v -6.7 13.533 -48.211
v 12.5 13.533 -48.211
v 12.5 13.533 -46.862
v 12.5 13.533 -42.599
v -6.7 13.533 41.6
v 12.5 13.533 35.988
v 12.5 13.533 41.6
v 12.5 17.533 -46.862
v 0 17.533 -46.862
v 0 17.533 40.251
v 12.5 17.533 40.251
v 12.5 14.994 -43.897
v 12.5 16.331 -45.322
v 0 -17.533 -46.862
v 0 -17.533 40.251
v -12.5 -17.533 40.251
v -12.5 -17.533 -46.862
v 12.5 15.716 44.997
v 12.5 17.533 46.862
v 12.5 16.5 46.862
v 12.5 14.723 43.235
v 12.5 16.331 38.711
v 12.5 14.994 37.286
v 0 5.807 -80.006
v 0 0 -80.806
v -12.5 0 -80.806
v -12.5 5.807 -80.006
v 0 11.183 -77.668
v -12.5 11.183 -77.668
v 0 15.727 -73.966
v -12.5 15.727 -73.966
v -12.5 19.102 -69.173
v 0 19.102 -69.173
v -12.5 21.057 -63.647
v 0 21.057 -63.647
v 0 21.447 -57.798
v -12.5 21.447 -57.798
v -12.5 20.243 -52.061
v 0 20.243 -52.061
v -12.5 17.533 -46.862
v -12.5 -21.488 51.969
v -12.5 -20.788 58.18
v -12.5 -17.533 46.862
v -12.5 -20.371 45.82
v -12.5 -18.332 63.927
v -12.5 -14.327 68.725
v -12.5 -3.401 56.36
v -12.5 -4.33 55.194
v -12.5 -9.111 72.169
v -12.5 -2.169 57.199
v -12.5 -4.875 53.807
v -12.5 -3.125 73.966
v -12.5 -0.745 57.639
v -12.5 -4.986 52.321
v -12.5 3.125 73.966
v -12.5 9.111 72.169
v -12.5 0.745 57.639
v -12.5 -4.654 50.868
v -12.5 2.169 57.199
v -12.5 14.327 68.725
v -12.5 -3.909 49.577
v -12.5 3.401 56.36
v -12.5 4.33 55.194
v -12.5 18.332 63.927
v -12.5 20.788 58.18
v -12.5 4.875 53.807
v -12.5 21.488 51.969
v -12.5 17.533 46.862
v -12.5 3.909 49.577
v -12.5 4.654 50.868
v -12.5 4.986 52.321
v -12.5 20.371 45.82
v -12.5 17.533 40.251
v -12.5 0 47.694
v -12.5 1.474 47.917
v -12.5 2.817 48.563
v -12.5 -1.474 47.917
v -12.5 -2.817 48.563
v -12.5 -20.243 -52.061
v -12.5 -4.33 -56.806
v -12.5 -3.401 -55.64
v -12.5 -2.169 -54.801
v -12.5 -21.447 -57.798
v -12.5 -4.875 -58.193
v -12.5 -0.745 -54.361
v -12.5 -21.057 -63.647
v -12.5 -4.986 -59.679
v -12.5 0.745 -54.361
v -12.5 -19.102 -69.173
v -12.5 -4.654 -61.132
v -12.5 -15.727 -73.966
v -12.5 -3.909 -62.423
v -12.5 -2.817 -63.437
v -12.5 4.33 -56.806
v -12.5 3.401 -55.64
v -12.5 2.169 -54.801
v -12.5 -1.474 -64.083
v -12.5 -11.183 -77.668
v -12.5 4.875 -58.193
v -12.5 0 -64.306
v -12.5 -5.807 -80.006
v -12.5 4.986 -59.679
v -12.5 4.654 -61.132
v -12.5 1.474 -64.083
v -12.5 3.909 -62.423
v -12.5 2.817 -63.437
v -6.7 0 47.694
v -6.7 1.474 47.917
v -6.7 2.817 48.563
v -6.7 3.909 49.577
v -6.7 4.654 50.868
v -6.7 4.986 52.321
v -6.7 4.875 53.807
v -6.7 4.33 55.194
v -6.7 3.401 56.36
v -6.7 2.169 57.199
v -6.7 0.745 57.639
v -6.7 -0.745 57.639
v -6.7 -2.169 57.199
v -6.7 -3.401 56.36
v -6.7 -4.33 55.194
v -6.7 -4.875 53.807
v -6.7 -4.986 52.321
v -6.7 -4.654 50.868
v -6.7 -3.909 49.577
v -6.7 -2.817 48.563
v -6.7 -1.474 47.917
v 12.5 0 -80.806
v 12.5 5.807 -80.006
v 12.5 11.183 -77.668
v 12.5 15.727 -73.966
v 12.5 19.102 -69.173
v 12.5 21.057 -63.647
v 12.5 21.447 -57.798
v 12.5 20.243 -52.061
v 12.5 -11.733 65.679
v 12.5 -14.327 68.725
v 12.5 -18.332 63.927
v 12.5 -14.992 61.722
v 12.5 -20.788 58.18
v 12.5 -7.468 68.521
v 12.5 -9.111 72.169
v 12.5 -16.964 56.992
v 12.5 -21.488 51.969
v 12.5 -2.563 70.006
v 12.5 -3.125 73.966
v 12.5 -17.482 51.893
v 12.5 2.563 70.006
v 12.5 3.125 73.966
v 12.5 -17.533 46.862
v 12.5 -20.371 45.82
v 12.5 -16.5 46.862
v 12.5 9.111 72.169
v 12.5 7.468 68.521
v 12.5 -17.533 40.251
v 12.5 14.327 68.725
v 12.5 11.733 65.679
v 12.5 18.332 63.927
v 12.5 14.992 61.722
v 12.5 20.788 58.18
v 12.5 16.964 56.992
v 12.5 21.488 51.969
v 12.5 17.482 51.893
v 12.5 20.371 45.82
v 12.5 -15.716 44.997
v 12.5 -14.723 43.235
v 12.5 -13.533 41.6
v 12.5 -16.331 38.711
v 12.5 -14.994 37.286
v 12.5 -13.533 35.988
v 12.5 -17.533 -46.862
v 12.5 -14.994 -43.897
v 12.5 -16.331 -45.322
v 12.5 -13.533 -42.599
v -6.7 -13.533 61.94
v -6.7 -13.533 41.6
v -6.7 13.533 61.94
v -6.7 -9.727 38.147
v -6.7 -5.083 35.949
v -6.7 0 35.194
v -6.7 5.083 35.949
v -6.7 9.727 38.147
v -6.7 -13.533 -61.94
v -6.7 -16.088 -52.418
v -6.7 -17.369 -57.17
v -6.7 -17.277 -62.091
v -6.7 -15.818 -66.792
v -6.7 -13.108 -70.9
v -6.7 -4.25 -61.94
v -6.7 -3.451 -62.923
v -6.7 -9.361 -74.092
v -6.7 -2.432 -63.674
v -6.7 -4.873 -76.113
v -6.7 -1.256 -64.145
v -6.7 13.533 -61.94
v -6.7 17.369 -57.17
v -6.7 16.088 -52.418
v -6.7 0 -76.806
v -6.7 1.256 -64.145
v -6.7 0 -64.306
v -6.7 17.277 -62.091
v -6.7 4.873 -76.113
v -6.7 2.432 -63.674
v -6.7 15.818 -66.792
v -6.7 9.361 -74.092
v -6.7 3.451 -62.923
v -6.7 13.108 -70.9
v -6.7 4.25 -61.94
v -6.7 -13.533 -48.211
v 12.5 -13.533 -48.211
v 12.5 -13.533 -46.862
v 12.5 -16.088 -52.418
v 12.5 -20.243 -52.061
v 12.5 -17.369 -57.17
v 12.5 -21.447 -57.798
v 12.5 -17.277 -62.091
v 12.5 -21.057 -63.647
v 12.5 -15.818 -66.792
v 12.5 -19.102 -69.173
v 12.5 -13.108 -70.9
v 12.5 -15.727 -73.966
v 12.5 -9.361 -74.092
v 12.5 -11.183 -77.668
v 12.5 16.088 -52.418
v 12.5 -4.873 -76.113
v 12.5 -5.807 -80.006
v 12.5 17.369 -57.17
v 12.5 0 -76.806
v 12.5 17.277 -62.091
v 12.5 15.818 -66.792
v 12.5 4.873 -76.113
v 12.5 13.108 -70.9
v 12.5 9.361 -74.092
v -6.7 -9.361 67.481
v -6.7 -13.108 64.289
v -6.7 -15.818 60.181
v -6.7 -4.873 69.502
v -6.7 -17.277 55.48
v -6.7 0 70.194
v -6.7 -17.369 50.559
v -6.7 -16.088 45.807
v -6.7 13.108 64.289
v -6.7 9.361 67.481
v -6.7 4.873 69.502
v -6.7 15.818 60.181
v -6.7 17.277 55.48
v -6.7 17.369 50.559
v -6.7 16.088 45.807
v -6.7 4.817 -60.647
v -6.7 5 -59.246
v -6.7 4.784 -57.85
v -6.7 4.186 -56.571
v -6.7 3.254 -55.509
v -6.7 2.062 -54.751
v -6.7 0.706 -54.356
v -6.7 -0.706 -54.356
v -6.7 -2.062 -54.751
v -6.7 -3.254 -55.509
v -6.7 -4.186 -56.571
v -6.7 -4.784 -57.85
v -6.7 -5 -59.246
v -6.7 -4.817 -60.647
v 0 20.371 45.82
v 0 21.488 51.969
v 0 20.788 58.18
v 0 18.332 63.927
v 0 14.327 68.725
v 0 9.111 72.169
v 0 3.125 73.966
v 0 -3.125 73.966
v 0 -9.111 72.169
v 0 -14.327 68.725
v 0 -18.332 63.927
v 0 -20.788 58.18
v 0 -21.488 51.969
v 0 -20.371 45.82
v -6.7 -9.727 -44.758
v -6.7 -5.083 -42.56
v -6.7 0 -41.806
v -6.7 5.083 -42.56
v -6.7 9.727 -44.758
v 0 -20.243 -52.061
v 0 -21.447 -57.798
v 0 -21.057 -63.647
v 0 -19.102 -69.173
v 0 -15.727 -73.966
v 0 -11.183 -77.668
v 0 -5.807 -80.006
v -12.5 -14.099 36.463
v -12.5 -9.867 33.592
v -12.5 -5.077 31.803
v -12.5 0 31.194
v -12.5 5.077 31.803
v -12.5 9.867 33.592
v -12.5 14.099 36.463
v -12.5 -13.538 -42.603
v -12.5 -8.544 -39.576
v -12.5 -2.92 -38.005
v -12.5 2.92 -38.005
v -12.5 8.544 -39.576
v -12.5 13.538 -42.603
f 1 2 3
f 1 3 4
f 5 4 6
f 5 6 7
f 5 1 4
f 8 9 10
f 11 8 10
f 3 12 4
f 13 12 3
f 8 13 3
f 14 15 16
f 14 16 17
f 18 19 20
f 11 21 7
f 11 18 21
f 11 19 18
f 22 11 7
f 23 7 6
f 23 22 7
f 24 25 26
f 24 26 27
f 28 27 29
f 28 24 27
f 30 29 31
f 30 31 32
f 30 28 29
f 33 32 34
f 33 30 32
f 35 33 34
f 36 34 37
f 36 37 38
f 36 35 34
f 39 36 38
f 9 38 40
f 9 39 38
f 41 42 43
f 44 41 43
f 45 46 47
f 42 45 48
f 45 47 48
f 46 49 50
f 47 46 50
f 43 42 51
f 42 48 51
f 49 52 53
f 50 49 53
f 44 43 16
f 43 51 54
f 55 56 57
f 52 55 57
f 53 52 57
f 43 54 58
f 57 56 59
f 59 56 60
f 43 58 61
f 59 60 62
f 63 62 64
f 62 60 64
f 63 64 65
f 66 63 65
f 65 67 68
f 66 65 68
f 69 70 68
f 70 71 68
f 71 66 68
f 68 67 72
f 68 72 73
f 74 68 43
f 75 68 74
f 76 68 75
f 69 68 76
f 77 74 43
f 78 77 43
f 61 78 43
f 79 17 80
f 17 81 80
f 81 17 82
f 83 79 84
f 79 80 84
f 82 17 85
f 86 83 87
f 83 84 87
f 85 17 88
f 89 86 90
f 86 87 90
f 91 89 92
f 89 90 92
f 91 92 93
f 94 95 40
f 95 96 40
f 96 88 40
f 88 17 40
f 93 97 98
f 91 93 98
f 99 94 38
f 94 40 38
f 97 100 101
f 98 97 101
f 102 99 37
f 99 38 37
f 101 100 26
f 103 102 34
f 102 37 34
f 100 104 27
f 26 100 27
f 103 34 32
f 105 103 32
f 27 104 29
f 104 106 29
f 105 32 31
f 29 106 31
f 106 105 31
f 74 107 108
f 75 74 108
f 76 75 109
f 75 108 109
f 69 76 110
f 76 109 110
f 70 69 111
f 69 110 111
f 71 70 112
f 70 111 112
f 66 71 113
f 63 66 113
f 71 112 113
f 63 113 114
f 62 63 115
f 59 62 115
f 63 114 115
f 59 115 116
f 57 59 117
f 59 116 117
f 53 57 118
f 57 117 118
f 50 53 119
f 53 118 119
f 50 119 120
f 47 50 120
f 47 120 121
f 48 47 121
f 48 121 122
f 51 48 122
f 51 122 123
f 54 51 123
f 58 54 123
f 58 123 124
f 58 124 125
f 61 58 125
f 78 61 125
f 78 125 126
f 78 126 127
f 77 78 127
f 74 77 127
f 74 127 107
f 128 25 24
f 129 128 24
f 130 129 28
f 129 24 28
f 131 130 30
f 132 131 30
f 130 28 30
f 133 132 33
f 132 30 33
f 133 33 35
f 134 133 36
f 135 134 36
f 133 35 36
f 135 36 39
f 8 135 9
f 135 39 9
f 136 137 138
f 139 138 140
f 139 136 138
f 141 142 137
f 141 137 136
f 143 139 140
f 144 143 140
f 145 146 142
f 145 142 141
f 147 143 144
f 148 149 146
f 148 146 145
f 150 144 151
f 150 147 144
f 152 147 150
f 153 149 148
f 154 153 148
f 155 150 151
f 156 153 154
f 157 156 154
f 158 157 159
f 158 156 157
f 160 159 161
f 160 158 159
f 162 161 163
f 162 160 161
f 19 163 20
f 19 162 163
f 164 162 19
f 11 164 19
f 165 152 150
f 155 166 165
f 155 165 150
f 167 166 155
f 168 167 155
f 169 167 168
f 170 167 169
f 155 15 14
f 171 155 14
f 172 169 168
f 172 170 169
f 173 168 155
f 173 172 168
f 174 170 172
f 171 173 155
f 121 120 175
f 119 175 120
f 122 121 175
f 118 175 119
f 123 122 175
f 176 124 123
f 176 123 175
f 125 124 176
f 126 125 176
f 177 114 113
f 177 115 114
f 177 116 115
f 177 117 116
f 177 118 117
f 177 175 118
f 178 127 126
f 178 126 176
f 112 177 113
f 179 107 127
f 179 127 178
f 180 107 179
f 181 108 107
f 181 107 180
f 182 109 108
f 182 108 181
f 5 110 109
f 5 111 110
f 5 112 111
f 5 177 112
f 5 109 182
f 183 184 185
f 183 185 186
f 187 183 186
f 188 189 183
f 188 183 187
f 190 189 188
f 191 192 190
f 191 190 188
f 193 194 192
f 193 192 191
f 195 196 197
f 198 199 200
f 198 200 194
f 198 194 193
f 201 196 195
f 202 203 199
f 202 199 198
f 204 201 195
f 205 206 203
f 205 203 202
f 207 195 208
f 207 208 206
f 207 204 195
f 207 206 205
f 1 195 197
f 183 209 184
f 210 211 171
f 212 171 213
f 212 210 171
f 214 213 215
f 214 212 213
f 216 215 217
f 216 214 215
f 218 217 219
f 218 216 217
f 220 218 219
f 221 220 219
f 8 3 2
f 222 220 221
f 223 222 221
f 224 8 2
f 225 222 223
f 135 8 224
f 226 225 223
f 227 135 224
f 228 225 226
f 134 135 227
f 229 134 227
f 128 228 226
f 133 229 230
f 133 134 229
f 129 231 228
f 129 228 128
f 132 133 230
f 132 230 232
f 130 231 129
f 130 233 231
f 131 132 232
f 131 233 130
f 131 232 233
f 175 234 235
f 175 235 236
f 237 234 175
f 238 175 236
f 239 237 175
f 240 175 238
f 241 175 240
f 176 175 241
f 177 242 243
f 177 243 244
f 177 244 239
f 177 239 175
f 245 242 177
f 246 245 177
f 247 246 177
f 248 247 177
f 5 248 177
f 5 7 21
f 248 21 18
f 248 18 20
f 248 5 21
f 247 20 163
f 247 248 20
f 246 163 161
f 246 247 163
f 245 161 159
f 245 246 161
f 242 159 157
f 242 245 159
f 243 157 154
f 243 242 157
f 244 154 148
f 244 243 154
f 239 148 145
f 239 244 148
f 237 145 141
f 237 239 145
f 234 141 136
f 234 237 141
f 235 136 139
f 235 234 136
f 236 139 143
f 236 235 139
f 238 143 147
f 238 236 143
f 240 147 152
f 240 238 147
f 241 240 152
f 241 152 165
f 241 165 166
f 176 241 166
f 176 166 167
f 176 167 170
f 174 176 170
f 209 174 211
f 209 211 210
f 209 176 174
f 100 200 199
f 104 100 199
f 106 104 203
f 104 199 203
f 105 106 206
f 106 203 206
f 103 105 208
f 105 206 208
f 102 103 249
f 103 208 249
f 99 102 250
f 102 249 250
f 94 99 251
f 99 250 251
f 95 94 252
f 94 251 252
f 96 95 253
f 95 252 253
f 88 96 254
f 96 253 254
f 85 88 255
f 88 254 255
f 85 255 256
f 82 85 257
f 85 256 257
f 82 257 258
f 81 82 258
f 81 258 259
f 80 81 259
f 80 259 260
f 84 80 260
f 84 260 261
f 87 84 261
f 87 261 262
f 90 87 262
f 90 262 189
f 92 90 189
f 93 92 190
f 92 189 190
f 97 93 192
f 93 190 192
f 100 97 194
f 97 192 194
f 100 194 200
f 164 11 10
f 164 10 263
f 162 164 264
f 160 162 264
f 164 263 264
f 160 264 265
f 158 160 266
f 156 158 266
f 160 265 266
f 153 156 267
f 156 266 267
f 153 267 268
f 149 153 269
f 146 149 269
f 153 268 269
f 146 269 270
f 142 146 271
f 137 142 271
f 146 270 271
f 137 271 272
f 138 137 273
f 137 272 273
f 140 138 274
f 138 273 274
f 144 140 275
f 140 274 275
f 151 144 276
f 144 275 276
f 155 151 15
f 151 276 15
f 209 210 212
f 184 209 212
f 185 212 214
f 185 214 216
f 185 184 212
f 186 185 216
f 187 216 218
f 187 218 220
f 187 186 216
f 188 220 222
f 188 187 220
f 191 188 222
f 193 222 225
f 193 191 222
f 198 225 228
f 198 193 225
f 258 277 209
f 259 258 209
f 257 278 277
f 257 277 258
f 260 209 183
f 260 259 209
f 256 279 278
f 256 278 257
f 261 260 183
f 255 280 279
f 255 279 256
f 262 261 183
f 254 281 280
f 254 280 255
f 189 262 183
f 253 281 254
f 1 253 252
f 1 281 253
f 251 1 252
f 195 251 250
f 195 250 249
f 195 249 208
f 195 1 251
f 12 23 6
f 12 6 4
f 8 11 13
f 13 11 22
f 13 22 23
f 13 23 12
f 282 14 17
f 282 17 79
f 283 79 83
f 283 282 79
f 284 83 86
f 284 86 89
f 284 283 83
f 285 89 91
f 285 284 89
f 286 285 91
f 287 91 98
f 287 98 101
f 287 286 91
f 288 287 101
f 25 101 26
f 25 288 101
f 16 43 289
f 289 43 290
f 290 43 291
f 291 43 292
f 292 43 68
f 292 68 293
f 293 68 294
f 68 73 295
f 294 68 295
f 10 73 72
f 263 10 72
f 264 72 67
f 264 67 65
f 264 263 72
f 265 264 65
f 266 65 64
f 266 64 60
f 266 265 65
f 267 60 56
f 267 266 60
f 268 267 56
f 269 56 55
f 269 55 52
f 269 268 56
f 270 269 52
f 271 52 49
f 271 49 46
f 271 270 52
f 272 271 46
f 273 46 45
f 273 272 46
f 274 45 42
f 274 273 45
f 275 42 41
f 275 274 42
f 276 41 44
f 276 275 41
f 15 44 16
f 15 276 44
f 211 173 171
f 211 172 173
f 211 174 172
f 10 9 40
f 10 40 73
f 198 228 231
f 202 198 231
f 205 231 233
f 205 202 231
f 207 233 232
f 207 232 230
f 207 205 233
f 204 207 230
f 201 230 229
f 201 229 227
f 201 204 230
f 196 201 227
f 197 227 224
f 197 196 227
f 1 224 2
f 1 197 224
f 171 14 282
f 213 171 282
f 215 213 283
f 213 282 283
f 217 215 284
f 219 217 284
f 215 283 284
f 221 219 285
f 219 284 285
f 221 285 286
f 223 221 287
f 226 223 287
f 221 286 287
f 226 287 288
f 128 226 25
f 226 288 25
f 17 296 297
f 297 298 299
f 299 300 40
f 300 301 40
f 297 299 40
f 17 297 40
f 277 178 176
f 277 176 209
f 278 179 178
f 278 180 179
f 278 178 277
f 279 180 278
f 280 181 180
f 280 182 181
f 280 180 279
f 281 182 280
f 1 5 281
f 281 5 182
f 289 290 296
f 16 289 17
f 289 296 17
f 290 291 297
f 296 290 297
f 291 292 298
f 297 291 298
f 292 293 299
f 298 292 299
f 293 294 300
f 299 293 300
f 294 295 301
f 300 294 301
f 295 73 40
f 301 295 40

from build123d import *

# Parameters (mm, degrees)
CROQUIS1_R              = 5
SALIENTE_EXTRUIR1_DEPTH = 12.5
CORTAR_EXTRUIR1_START   = -19.2
CROQUIS2_R              = 5
CORTAR_EXTRUIR1_DEPTH   = 19.2


with BuildPart() as part:
    # Croquis1 → Saliente-Extruir1 (new, symmetric)
    # profile 1 of 5: a face of its own
    with BuildSketch(Plane(origin=(0, 0, 0), x_dir=(0, 0, -1), z_dir=(1, 0, 0))):
        with BuildLine():
            Line((-46.862494928, -17.533403612), (-46.862494928, 17.533403612))
            Line((-46.862494928, 17.533403612), (-40.251383817, 17.533403612))
            ThreePointArc((-40.251383817, 17.533403612), (-74.194444444, 0), (-40.251383817, -17.533403612))
            Line((-40.251383817, -17.533403612), (-46.862494928, -17.533403612))
        make_face()
        with Locations((-52.694444444, 0)):
            Circle(CROQUIS1_R, mode=Mode.SUBTRACT)
    # profile 2 of 5: a face of its own
    with BuildSketch(Plane(origin=(0, 0, 0), x_dir=(0, 0, -1), z_dir=(1, 0, 0))):
        with BuildLine():
            Line((-40.251383817, 17.533403612), (-46.862494928, 17.533403612))
            Line((-46.862494928, 17.533403612), (-46.862494928, -17.533403612))
            Line((-46.862494928, -17.533403612), (-40.251383817, -17.533403612))
            ThreePointArc((-40.251383817, -17.533403612), (-33.592405241, -9.867223432), (-31.194444444, 0))
            ThreePointArc((-31.194444444, 0), (-33.592405241, 9.867223432), (-40.251383817, 17.533403612))
        make_face()
    # profile 3 of 5: a face of its own
    with BuildSketch(Plane(origin=(0, 0, 0), x_dir=(0, 0, -1), z_dir=(1, 0, 0))):
        with BuildLine():
            Line((46.862494928, 17.533403612), (-40.251383817, 17.533403612))
            ThreePointArc((-40.251383817, 17.533403612), (-33.592405241, 9.867223432), (-31.194444444, 0))
            ThreePointArc((-31.194444444, 0), (-33.592405241, -9.867223432), (-40.251383817, -17.533403612))
            Line((-40.251383817, -17.533403612), (46.862494928, -17.533403612))
            ThreePointArc((46.862494928, -17.533403612), (37.805555556, 0), (46.862494928, 17.533403612))
        make_face()
    # profile 4 of 5: a face of its own
    with BuildSketch(Plane(origin=(0, 0, 0), x_dir=(0, 0, -1), z_dir=(1, 0, 0))):
        with BuildLine():
            Line((46.862494928, -17.533403612), (46.862494928, 17.533403612))
            ThreePointArc((46.862494928, 17.533403612), (37.805555556, 0), (46.862494928, -17.533403612))
        make_face()
    # profile 5 of 5: a face of its own
    with BuildSketch(Plane(origin=(0, 0, 0), x_dir=(0, 0, -1), z_dir=(1, 0, 0))):
        with BuildLine():
            ThreePointArc((80.805555556, 0), (69.172778987, 19.102039204), (46.862494928, 17.533403612))
            Line((46.862494928, 17.533403612), (46.862494928, -17.533403612))
            ThreePointArc((46.862494928, -17.533403612), (69.172778987, -19.102039204), (80.805555556, 0))
        make_face()
        with Locations((59.305555556, 0)):
            Circle(CROQUIS1_R, mode=Mode.SUBTRACT)
    extrude(amount=SALIENTE_EXTRUIR1_DEPTH, both=True)

    # Croquis2 → Cortar-Extruir1 (cut)
    # profile 1 of 7: a face of its own
    with BuildSketch(Plane(origin=(12.5, 0, 0), x_dir=(0, 0, -1), z_dir=(1, 0, 0)).offset(CORTAR_EXTRUIR1_START)):
        with BuildLine():
            Line((-61.940275078, -13.533403612), (-61.940275078, 13.533403612))
            Line((-61.940275078, 13.533403612), (-41.599536302, 13.533403612))
            ThreePointArc((-41.599536302, 13.533403612), (-70.194444444, 0), (-41.599536302, -13.533403612))
            Line((-41.599536302, -13.533403612), (-61.940275078, -13.533403612))
        make_face()
    # profile 2 of 7: a face of its own
    with BuildSketch(Plane(origin=(12.5, 0, 0), x_dir=(0, 0, -1), z_dir=(1, 0, 0)).offset(CORTAR_EXTRUIR1_START)):
        with BuildLine():
            Line((-41.599536302, 13.533403612), (-61.940275078, 13.533403612))
            Line((-61.940275078, 13.533403612), (-61.940275078, -13.533403612))
            Line((-61.940275078, -13.533403612), (-41.599536302, -13.533403612))
            ThreePointArc((-41.599536302, -13.533403612), (-36.876560697, -7.486291055), (-35.194444444, 0))
            ThreePointArc((-35.194444444, 0), (-36.876560697, 7.486291055), (-41.599536302, 13.533403612))
        make_face()
        with Locations((-52.694444444, 0)):
            Circle(CROQUIS2_R, mode=Mode.SUBTRACT)
    # profile 3 of 7: a face of its own
    with BuildSketch(Plane(origin=(12.5, 0, 0), x_dir=(0, 0, -1), z_dir=(1, 0, 0)).offset(CORTAR_EXTRUIR1_START)):
        with BuildLine():
            Line((48.210647414, 13.533403612), (-41.599536302, 13.533403612))
            ThreePointArc((-41.599536302, 13.533403612), (-36.876560697, 7.486291055), (-35.194444444, 0))
            ThreePointArc((-35.194444444, 0), (-36.876560697, -7.486291055), (-41.599536302, -13.533403612))
            Line((-41.599536302, -13.533403612), (48.210647414, -13.533403612))
            ThreePointArc((48.210647414, -13.533403612), (41.805555556, 0), (48.210647414, 13.533403612))
        make_face()
    # profile 4 of 7: a face of its own
    with BuildSketch(Plane(origin=(12.5, 0, 0), x_dir=(0, 0, -1), z_dir=(1, 0, 0)).offset(CORTAR_EXTRUIR1_START)):
        with BuildLine():
            ThreePointArc((76.805555556, 0), (66.79184661, 15.817883747), (48.210647414, 13.533403612))
            Line((48.210647414, 13.533403612), (61.940275078, 13.533403612))
            Line((61.940275078, 13.533403612), (61.940275078, 4.249500328))
            ThreePointArc((61.940275078, 4.249500328), (63.67439966, 2.431707465), (64.305555556, 0))
            ThreePointArc((64.305555556, 0), (63.67439966, -2.431707465), (61.940275078, -4.249500328))
            Line((61.940275078, -4.249500328), (61.940275078, -13.533403612))
            Line((61.940275078, -13.533403612), (48.210647414, -13.533403612))
            ThreePointArc((48.210647414, -13.533403612), (66.79184661, -15.817883747), (76.805555556, 0))
        make_face()
    # profile 5 of 7: a face of its own
    with BuildSketch(Plane(origin=(12.5, 0, 0), x_dir=(0, 0, -1), z_dir=(1, 0, 0)).offset(CORTAR_EXTRUIR1_START)):
        with BuildLine():
            Line((61.940275078, 13.533403612), (48.210647414, 13.533403612))
            ThreePointArc((48.210647414, 13.533403612), (41.805555556, 0), (48.210647414, -13.533403612))
            Line((48.210647414, -13.533403612), (61.940275078, -13.533403612))
            Line((61.940275078, -13.533403612), (61.940275078, -4.249500328))
            ThreePointArc((61.940275078, -4.249500328), (54.305555556, 0), (61.940275078, 4.249500328))
            Line((61.940275078, 4.249500328), (61.940275078, 13.533403612))
        make_face()
    # profile 6 of 7: a face of its own
    with BuildSketch(Plane(origin=(12.5, 0, 0), x_dir=(0, 0, -1), z_dir=(1, 0, 0)).offset(CORTAR_EXTRUIR1_START)):
        with BuildLine():
            ThreePointArc((76.805555556, 0), (66.79184661, 15.817883747), (48.210647414, 13.533403612))
            Line((48.210647414, 13.533403612), (61.940275078, 13.533403612))
            Line((61.940275078, 13.533403612), (61.940275078, 4.249500328))
            ThreePointArc((61.940275078, 4.249500328), (63.67439966, 2.431707465), (64.305555556, 0))
            ThreePointArc((64.305555556, 0), (63.67439966, -2.431707465), (61.940275078, -4.249500328))
            Line((61.940275078, -4.249500328), (61.940275078, -13.533403612))
            Line((61.940275078, -13.533403612), (48.210647414, -13.533403612))
            ThreePointArc((48.210647414, -13.533403612), (66.79184661, -15.817883747), (76.805555556, 0))
        make_face()
    # profile 7 of 7: a face of its own
    with BuildSketch(Plane(origin=(12.5, 0, 0), x_dir=(0, 0, -1), z_dir=(1, 0, 0)).offset(CORTAR_EXTRUIR1_START)):
        with BuildLine():
            Line((61.940275078, 13.533403612), (48.210647414, 13.533403612))
            ThreePointArc((48.210647414, 13.533403612), (41.805555556, 0), (48.210647414, -13.533403612))
            Line((48.210647414, -13.533403612), (61.940275078, -13.533403612))
            Line((61.940275078, -13.533403612), (61.940275078, -4.249500328))
            ThreePointArc((61.940275078, -4.249500328), (54.305555556, 0), (61.940275078, 4.249500328))
            Line((61.940275078, 4.249500328), (61.940275078, 13.533403612))
        make_face()
    extrude(amount=CORTAR_EXTRUIR1_DEPTH, mode=Mode.SUBTRACT)


solid = part.part
